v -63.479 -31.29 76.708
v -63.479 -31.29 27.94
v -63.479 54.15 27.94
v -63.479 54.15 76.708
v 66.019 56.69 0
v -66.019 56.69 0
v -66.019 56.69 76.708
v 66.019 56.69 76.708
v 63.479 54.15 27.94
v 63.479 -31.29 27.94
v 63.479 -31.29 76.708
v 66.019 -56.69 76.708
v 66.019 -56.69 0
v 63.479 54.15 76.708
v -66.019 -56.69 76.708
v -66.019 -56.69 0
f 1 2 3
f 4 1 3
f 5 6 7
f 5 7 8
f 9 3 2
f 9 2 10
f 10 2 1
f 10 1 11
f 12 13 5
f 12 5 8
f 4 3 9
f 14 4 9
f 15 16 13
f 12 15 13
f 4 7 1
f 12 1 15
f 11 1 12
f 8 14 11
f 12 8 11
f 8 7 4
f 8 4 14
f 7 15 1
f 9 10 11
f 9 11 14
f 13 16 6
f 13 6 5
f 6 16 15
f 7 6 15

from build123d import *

# Parameters (mm, degrees)
F0_W     = 132.037088275
F0_H     = 113.3796721697
F1_DEPTH = 76.708
F2_T     = -2.54
F3_DEPTH = 25.4
F4_DEPTH = 25.4


with BuildPart() as f1:
    # F0 (on Top) → F1 (new body)
    with BuildSketch(Plane.XY):
        Rectangle(F0_W, F0_H)
    extrude(amount=F1_DEPTH)

    # F2
    f2_openings = [f1.faces().sort_by_distance(p)[0] for p in [
        (0, 0, 76.708),
    ]]
    offset(amount=F2_T, openings=f2_openings)

    # F3 (add): a face of the model
    f3_faces = [f1.faces().sort_by_distance(p)[0] for p in [
        (0, 0, 2.54),
    ]]
    extrude(f3_faces, amount=F3_DEPTH)

    # F4 (add): a face of the model
    f4_faces = [f1.faces().sort_by_distance(p)[0] for p in [
        (0, -56.6898360848, 38.354),
    ]]
    extrude(f4_faces, amount=-F4_DEPTH)


solid = f1.part
